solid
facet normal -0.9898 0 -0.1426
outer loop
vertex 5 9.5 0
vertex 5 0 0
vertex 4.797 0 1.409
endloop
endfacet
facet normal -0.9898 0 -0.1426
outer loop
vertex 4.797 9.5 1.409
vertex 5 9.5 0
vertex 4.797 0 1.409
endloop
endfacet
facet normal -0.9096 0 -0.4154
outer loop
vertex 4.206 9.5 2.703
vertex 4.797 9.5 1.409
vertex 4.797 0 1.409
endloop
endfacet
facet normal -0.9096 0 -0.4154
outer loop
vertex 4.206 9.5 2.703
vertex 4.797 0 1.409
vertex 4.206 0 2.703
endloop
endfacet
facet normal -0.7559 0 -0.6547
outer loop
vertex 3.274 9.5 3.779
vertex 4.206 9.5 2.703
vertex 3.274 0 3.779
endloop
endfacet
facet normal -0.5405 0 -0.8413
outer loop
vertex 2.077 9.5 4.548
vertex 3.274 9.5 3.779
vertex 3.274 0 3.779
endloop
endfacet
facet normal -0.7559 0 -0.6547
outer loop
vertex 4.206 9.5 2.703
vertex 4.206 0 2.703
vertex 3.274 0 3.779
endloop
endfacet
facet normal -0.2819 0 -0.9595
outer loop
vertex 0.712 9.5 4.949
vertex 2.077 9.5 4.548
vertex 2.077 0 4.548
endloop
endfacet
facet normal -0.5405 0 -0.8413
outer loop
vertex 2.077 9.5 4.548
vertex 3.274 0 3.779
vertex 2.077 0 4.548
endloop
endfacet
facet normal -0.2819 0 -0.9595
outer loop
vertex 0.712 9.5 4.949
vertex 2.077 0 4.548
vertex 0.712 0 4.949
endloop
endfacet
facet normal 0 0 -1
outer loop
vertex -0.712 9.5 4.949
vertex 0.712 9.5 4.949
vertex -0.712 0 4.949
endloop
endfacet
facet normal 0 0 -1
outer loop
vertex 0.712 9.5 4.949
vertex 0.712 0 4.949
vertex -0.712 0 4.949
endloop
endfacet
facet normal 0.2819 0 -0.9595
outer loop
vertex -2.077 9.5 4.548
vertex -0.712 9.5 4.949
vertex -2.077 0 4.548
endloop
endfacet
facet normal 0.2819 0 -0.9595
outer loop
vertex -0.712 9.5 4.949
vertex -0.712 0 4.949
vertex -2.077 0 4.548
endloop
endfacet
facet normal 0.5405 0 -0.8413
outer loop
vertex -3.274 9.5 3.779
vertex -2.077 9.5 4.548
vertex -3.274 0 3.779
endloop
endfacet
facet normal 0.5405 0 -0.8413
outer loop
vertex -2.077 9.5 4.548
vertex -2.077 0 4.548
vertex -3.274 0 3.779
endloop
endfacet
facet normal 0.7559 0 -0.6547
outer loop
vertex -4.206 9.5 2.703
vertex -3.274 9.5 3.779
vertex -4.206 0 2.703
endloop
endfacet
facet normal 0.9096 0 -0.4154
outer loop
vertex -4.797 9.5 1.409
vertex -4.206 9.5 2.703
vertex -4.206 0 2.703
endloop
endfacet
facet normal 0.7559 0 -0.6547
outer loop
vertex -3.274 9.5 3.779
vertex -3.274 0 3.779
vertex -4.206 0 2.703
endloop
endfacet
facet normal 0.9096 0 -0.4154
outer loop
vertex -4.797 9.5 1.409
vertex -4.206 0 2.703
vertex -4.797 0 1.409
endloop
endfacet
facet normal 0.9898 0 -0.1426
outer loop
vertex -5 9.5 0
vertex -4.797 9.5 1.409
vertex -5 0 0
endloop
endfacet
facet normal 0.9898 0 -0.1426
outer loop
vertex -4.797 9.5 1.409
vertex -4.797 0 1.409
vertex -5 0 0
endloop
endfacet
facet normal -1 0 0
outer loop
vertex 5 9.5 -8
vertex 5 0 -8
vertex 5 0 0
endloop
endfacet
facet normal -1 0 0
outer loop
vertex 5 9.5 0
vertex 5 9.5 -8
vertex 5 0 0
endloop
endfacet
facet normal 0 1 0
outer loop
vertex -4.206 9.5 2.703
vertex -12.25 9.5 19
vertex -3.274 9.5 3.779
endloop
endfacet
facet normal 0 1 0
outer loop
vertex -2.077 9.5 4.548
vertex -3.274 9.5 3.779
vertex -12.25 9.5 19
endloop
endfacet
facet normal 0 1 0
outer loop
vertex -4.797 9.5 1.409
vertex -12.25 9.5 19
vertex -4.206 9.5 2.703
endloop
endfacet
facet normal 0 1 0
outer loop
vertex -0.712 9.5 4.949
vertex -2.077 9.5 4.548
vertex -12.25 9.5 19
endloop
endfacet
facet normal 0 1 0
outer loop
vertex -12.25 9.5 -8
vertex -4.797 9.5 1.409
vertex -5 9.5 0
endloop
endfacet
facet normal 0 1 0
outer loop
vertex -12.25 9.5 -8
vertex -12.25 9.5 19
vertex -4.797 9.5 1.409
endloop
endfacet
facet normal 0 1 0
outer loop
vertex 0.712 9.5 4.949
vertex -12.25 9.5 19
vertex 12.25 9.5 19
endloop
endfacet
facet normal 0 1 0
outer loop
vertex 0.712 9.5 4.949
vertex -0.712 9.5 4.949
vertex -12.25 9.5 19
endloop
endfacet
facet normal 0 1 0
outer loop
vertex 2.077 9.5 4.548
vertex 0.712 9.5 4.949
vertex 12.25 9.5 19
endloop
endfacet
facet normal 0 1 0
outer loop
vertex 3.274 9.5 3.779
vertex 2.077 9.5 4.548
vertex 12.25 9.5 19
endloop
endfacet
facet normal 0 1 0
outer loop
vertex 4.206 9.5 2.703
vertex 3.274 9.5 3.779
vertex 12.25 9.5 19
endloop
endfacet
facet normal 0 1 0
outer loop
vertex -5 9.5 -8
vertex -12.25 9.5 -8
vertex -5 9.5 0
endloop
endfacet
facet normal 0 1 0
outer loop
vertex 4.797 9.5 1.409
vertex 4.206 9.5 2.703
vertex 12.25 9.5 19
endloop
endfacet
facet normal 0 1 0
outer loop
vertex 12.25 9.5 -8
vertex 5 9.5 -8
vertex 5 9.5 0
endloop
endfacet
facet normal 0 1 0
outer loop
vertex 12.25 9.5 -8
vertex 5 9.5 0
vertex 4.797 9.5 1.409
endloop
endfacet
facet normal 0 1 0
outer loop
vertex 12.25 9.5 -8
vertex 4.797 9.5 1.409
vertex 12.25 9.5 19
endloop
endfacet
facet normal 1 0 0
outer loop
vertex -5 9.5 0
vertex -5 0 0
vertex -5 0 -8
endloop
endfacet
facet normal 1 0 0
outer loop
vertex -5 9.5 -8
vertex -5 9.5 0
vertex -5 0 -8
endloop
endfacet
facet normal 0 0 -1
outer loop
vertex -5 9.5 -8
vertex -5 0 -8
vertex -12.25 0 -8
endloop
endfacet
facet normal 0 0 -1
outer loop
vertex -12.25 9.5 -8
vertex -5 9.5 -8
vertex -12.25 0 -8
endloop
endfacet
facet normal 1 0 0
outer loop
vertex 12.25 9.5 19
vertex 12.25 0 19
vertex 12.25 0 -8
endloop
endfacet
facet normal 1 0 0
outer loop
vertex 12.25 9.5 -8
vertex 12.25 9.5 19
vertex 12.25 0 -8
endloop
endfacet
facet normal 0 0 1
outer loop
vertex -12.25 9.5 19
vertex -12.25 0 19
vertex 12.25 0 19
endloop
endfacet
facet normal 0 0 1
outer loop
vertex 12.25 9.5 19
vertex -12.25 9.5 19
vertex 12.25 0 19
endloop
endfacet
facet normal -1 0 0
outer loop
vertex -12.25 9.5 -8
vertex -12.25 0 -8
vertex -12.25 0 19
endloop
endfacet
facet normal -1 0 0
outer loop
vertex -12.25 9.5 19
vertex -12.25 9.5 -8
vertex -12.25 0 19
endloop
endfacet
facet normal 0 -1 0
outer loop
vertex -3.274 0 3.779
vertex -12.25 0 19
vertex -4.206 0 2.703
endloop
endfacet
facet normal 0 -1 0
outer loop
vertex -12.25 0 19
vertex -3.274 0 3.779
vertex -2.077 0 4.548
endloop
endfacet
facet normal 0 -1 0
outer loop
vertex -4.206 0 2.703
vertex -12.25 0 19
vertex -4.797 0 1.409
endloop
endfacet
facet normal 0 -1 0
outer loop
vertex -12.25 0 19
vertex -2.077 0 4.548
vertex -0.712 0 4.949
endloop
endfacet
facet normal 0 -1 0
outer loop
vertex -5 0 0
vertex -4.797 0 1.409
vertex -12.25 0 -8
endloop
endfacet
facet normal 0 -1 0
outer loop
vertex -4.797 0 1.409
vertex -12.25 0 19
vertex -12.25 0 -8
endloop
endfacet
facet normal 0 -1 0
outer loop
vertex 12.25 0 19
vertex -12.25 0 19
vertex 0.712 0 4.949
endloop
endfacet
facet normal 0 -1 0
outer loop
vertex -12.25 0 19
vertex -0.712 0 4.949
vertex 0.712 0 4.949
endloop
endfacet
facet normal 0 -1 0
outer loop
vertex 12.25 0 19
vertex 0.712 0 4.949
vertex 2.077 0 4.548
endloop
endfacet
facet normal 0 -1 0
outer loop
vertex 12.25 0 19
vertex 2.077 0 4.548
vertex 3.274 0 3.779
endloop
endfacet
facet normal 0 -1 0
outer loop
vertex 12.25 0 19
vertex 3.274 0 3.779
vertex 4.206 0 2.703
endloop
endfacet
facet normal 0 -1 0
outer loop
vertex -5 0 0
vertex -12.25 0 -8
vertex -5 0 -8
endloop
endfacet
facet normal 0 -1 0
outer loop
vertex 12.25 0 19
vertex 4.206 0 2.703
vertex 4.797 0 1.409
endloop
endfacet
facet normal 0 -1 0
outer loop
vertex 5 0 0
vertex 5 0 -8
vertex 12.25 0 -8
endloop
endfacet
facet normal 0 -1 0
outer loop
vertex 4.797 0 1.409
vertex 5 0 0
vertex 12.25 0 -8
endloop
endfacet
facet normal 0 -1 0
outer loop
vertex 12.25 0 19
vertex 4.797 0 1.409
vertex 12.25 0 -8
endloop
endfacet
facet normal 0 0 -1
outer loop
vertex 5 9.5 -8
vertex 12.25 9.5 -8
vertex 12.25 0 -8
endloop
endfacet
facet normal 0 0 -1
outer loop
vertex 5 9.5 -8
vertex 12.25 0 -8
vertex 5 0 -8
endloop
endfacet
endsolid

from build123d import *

# Parameters (mm, degrees)
DODANIE_WYCI_GNI_CIE1_DEPTH = 9.5


with BuildPart() as part:
    # Szkic1 → Dodanie-wyciągnięcie1 (new body)
    with BuildSketch(Plane(origin=(0, 0, 0), x_dir=(1, 0, 0), z_dir=(0, 1, 0))):
        with BuildLine():
            ThreePointArc((5, 0), (0, -5), (-5, 0))
            Line((-5, 0), (-5, 8))
            Line((-5, 8), (-12.25, 8))
            Line((-12.25, 8), (-12.25, -19))
            Line((-12.25, -19), (12.25, -19))
            Line((12.25, -19), (12.25, 8))
            Line((12.25, 8), (5, 8))
            Line((5, 8), (5, 0))
        make_face()
    extrude(amount=DODANIE_WYCI_GNI_CIE1_DEPTH)


solid = part.part
